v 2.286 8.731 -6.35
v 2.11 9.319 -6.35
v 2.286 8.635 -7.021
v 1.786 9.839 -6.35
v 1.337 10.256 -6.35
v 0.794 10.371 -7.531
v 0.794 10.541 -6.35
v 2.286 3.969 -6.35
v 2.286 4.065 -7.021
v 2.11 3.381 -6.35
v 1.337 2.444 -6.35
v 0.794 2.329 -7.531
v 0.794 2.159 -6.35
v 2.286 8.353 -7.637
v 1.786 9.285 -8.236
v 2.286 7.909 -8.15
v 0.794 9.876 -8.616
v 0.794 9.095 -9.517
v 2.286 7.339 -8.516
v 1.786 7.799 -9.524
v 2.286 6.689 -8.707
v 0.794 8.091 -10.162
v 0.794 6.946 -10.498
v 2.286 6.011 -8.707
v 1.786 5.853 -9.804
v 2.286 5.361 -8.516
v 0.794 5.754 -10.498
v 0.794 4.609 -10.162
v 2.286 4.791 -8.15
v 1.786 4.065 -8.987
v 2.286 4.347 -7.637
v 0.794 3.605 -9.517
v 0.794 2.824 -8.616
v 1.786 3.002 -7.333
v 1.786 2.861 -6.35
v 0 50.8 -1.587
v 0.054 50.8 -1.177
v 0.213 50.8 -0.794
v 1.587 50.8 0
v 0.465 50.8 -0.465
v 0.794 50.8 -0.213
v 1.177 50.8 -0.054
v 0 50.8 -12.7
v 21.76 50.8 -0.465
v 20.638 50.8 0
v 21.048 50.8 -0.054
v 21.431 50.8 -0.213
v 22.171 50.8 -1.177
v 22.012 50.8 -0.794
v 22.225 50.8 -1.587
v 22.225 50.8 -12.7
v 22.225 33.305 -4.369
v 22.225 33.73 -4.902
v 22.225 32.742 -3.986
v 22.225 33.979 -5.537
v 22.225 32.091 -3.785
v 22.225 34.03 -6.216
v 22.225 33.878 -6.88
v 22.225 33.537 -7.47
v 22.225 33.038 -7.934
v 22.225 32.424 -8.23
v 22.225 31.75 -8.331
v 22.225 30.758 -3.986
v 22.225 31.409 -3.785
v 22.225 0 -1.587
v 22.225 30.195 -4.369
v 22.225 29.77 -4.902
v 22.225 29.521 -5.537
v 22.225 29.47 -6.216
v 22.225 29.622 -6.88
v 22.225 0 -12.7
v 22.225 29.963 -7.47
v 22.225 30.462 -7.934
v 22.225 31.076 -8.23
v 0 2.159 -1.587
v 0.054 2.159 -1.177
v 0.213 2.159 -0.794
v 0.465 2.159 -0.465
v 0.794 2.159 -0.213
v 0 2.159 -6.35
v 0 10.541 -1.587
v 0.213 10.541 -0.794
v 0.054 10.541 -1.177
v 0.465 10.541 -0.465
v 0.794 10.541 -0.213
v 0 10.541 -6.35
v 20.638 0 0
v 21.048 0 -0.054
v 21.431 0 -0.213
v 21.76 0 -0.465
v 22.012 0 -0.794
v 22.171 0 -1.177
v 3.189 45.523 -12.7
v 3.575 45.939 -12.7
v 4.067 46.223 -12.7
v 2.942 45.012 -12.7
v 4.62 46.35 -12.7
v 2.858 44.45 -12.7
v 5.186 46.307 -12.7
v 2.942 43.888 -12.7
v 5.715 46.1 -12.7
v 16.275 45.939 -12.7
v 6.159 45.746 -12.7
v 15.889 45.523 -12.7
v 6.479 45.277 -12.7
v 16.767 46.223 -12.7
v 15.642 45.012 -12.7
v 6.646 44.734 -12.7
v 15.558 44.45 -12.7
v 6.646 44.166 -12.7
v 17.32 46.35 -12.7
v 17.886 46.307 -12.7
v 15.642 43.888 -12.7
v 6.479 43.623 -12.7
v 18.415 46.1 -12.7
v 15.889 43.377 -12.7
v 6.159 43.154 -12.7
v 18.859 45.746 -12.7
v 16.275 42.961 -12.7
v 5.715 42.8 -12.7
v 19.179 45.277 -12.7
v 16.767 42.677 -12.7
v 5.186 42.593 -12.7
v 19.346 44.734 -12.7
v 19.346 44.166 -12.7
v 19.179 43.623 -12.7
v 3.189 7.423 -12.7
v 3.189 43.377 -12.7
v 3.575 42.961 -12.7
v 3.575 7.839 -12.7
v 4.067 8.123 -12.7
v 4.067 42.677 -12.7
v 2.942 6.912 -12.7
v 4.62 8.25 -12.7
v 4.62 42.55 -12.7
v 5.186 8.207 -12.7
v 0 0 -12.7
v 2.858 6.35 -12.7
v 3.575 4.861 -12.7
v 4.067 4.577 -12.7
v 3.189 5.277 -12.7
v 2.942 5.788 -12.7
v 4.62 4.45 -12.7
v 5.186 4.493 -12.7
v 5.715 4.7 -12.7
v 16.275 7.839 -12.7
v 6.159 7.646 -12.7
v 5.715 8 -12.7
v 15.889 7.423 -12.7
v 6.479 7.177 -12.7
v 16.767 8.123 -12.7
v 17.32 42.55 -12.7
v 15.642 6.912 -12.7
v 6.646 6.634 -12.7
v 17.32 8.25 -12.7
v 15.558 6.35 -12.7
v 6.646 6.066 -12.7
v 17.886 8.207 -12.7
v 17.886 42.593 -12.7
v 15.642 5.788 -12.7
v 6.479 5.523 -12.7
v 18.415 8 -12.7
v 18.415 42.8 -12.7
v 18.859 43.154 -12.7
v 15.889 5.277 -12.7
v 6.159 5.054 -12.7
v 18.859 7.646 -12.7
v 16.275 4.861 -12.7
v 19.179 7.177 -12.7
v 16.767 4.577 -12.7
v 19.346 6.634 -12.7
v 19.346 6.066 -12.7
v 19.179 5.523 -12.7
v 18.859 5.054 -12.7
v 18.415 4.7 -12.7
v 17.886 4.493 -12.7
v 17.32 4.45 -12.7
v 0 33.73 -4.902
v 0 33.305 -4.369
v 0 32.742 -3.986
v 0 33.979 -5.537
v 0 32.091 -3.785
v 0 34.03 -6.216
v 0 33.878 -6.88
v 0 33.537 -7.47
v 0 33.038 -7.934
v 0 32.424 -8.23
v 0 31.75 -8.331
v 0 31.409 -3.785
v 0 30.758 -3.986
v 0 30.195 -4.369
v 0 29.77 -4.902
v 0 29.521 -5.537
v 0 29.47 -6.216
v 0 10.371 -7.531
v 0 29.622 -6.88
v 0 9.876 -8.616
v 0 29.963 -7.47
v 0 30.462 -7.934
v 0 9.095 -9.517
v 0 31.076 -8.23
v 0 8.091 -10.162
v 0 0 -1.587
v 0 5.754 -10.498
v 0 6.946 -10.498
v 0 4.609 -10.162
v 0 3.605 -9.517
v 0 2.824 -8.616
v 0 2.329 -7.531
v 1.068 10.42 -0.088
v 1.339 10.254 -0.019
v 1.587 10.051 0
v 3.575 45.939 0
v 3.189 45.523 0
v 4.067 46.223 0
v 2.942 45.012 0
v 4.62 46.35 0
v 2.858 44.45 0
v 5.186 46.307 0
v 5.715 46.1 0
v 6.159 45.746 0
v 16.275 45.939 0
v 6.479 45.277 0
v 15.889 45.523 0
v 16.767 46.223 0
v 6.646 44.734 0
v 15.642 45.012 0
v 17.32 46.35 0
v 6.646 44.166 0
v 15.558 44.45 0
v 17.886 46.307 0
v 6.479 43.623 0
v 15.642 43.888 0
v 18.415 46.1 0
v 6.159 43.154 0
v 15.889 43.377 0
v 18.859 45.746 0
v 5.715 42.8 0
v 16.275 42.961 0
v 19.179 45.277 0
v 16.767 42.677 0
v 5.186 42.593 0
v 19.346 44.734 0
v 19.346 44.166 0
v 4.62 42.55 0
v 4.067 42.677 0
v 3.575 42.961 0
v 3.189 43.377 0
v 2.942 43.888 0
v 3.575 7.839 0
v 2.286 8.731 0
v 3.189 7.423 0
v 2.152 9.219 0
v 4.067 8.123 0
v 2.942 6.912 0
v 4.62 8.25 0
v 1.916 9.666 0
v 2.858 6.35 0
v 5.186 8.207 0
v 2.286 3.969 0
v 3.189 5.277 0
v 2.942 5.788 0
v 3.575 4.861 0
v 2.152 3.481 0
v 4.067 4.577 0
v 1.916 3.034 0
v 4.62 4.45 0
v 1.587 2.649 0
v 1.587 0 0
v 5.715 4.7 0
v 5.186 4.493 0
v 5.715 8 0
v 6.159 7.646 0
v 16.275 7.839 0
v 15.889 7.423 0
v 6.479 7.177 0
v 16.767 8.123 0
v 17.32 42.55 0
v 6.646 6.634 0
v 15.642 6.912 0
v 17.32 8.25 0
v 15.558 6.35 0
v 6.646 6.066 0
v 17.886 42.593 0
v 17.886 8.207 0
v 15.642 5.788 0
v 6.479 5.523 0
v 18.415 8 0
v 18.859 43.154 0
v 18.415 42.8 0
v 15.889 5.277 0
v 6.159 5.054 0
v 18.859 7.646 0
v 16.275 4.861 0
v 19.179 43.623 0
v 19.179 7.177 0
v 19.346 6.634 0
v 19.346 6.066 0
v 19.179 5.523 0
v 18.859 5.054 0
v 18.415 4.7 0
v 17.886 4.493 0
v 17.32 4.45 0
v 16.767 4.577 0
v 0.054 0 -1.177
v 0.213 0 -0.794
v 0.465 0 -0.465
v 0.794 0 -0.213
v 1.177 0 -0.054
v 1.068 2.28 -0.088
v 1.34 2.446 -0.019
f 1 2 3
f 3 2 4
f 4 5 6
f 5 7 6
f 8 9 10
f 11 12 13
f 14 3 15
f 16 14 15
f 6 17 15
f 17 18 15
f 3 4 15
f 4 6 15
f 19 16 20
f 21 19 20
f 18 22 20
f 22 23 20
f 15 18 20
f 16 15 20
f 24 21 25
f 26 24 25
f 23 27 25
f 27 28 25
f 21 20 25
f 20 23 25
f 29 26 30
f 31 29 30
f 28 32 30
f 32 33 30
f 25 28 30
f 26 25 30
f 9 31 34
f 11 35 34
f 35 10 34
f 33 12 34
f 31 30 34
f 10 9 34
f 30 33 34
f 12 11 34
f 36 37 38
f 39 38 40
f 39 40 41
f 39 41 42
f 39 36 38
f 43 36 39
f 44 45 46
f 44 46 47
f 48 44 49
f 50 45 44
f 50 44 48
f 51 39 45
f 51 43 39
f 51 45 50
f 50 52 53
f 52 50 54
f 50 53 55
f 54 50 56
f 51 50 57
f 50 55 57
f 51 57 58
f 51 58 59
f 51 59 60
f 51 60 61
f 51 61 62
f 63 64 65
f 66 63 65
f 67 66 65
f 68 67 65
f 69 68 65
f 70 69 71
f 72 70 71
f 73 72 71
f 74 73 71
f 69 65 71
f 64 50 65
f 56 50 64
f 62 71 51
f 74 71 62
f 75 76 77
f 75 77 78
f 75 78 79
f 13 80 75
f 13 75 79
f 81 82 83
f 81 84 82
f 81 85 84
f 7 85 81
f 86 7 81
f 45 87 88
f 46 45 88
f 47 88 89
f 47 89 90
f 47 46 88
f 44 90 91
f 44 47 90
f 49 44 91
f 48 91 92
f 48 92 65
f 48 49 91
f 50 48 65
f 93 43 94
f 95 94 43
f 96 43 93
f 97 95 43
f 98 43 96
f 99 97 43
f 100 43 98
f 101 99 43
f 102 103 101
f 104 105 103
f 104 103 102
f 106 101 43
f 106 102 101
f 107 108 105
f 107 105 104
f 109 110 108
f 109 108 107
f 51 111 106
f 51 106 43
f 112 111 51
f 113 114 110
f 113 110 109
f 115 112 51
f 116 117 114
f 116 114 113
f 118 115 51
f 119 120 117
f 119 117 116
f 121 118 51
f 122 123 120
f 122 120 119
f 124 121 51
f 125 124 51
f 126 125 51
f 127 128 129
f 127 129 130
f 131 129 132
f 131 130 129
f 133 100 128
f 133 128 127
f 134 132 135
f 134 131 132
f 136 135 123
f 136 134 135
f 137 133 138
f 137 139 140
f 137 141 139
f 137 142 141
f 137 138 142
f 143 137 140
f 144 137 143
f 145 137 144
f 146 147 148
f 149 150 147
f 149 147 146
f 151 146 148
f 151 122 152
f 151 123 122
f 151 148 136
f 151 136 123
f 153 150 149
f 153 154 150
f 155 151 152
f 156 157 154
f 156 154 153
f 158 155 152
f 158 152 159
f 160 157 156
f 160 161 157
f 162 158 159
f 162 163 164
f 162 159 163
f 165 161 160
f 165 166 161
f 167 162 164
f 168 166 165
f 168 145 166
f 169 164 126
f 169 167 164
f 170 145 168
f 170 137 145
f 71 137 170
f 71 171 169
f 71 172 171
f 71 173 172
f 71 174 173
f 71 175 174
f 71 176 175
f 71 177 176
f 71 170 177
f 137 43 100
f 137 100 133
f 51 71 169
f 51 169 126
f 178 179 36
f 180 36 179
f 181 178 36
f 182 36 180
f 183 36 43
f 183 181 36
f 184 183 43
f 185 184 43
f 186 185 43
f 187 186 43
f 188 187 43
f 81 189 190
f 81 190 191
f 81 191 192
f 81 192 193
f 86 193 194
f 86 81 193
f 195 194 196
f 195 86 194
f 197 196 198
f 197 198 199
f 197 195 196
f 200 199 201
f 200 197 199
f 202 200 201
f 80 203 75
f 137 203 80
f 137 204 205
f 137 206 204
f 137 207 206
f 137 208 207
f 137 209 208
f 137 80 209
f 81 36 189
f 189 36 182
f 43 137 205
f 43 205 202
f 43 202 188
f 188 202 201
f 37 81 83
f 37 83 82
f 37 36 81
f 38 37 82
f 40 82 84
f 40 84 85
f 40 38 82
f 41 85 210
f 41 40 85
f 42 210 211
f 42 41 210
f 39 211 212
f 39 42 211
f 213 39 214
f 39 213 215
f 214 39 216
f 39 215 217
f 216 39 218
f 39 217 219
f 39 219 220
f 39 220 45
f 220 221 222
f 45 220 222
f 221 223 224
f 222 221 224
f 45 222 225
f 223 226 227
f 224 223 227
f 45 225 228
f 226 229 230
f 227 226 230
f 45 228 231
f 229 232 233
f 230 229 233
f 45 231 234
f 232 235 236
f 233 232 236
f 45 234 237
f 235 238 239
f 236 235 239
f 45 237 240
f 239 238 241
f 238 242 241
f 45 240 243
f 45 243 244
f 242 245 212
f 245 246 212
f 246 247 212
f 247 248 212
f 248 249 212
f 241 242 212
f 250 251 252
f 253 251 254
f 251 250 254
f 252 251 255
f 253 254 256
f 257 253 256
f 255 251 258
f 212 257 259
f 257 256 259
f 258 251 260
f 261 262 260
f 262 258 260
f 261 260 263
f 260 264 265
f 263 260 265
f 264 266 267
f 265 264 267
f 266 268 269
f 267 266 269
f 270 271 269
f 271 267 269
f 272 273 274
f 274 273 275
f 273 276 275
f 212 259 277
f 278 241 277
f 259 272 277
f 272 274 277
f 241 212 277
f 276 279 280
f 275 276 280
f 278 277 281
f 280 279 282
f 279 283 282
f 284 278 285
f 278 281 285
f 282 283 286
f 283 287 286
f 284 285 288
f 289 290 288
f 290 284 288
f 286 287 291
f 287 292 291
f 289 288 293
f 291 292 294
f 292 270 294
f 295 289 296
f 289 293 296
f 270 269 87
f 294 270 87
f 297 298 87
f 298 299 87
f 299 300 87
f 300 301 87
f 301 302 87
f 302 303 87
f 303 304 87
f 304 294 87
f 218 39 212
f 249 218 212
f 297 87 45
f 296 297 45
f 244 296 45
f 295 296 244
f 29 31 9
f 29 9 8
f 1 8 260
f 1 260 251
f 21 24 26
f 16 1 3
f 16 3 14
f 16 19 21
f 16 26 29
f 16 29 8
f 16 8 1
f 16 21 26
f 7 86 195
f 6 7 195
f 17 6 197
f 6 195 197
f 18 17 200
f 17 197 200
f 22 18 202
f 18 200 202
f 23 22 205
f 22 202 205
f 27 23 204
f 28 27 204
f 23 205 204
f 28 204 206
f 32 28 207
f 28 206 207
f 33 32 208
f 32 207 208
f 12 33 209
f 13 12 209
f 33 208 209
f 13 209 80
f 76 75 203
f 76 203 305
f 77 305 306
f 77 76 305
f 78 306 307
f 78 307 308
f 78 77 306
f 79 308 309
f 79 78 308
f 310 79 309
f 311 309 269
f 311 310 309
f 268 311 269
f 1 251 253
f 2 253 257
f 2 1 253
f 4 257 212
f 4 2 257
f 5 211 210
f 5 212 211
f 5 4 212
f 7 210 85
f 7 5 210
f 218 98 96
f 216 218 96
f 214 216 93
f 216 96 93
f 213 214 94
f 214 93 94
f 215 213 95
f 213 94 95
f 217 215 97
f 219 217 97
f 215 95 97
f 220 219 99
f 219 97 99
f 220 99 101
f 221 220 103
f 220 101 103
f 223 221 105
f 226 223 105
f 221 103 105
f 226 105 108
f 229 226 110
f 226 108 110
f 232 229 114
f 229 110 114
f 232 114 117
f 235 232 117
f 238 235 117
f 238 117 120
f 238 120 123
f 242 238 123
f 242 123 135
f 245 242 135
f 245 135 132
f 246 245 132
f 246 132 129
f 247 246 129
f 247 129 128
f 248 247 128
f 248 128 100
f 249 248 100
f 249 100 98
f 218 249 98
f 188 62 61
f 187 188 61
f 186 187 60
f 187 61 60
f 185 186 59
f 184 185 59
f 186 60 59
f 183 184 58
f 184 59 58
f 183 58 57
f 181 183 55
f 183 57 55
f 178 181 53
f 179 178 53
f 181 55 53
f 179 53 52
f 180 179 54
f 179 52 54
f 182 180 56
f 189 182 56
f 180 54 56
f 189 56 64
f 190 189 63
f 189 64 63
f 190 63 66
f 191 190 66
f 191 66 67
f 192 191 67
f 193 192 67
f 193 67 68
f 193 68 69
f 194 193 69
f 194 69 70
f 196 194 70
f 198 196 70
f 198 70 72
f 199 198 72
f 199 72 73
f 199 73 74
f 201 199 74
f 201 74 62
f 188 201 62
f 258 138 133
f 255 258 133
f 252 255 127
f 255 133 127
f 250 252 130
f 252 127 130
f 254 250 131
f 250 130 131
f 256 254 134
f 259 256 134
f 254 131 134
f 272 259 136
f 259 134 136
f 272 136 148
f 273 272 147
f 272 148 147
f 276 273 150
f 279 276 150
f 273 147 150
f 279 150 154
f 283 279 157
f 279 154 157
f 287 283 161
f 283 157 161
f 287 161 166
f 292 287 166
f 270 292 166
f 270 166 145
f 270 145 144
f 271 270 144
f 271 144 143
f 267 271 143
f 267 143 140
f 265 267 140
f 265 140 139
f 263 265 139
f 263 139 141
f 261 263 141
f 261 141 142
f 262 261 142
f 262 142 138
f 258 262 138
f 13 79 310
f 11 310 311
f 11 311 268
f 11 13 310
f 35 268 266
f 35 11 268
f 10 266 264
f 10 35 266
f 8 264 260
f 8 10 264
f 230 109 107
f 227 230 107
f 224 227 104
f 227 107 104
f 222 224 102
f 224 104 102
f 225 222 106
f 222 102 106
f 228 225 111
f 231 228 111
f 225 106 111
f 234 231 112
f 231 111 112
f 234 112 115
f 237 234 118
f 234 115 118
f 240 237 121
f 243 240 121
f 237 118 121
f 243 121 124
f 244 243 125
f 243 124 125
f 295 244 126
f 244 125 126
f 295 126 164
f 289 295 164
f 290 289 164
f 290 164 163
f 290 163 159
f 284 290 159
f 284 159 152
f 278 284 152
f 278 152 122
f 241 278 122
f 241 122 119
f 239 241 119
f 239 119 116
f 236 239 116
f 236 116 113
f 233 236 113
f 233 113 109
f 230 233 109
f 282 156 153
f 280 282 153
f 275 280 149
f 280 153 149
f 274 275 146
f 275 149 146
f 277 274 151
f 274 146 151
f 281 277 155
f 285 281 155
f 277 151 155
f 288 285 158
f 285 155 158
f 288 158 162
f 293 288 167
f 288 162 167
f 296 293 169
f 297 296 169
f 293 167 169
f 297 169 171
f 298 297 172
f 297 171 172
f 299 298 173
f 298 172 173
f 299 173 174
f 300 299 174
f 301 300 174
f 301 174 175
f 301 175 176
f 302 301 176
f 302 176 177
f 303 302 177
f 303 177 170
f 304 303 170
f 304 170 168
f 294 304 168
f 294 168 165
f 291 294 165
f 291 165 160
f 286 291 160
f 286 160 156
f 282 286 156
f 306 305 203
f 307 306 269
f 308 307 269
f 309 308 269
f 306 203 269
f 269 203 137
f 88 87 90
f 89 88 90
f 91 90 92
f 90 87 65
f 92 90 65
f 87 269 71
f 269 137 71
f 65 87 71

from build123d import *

# Parameters (mm, degrees)
SKETCH1_W           = 22.225
SKETCH1_H           = 12.7
BOSS_EXTRUDE1_DEPTH = 50.8
SKETCH2_R           = 1.905
CUT_EXTRUDE1_DEPTH  = 57.884801353
CUT_EXTRUDE2_DEPTH  = 56.811406764
FILLET1_R           = 1.5875
SKETCH6_R           = 2.286
CUT_EXTRUDE3_DEPTH  = 57.884801482


with BuildPart() as part:
    # Sketch1 → Boss-Extrude1 (new body)
    with BuildSketch(Plane(origin=(0, 0, 0), x_dir=(1, 0, 0), z_dir=(0, 1, 0))):
        with Locations((11.1125, 6.35)):
            Rectangle(SKETCH1_W, SKETCH1_H)
    extrude(amount=BOSS_EXTRUDE1_DEPTH)

    # Sketch2 → Cut-Extrude1 (cut, through all)
    with BuildSketch(Plane(origin=(0, 0, -12.7), x_dir=(-1, 0, 0), z_dir=(0, 0, -1))):
        with Locations((-17.4625, 44.45)):
            Circle(SKETCH2_R)
        with Locations((-17.4625, 6.35)):
            Circle(SKETCH2_R)
        with Locations((-4.7625, 44.45)):
            Circle(SKETCH2_R)
        with Locations((-4.7625, 6.35)):
            Circle(SKETCH2_R)
    extrude(amount=-CUT_EXTRUDE1_DEPTH, mode=Mode.SUBTRACT)

    # Sketch3 → Cut-Extrude2 (cut, through all)
    with BuildSketch(Plane(origin=(0, 0, -6.35), x_dir=(-1, 0, 0), z_dir=(0, 0, -1))):
        with BuildLine():
            Line((0, 10.541), (0, 2.159))
            Line((0, 2.159), (-0.79375, 2.159))
            ThreePointArc((-0.79375, 2.159), (-1.786060968, 2.860879553), (-2.286, 3.96875))
            Line((-2.286, 3.96875), (-2.286, 8.73125))
            ThreePointArc((-2.286, 8.73125), (-1.786060968, 9.839120447), (-0.79375, 10.541))
            Line((-0.79375, 10.541), (0, 10.541))
        make_face()
    extrude(amount=-CUT_EXTRUDE2_DEPTH, mode=Mode.SUBTRACT)

    # Sketch5 → Cut-Revolve2 (revolve, cut)
    with BuildSketch(Plane(origin=(0, 0, -6.35), x_dir=(-1, 0, 0), z_dir=(0, 0, -1))):
        with BuildLine():
            Line((0, 6.35), (-2.286, 6.35))
            Line((-2.286, 6.35), (-2.286, 8.73125))
            ThreePointArc((-2.286, 8.73125), (-1.786060968, 9.839120447), (-0.79375, 10.541))
            Line((-0.79375, 10.541), (0, 10.541))
            Line((0, 10.541), (0, 6.35))
        make_face()
    revolve(axis=Axis((2.286, 6.35, -6.35), (-1, 0, 0)), mode=Mode.SUBTRACT)

    # Fillet1
    fillet1_edges = [part.edges().sort_by_distance(p)[0] for p in [
        (0, 30.6705, 0),
        (0, 1.0795, 0),
        (22.225, 25.4, 0),
    ]]
    fillet(fillet1_edges, radius=FILLET1_R)

    # Sketch6 → Cut-Extrude3 (cut, through all)
    with BuildSketch(Plane(origin=(22.225, 0, 0), x_dir=(0, 0, -1), z_dir=(1, 0, 0))):
        with Locations((6.045199993, 31.75)):
            Circle(SKETCH6_R)
    extrude(amount=-CUT_EXTRUDE3_DEPTH, mode=Mode.SUBTRACT)


solid = part.part
